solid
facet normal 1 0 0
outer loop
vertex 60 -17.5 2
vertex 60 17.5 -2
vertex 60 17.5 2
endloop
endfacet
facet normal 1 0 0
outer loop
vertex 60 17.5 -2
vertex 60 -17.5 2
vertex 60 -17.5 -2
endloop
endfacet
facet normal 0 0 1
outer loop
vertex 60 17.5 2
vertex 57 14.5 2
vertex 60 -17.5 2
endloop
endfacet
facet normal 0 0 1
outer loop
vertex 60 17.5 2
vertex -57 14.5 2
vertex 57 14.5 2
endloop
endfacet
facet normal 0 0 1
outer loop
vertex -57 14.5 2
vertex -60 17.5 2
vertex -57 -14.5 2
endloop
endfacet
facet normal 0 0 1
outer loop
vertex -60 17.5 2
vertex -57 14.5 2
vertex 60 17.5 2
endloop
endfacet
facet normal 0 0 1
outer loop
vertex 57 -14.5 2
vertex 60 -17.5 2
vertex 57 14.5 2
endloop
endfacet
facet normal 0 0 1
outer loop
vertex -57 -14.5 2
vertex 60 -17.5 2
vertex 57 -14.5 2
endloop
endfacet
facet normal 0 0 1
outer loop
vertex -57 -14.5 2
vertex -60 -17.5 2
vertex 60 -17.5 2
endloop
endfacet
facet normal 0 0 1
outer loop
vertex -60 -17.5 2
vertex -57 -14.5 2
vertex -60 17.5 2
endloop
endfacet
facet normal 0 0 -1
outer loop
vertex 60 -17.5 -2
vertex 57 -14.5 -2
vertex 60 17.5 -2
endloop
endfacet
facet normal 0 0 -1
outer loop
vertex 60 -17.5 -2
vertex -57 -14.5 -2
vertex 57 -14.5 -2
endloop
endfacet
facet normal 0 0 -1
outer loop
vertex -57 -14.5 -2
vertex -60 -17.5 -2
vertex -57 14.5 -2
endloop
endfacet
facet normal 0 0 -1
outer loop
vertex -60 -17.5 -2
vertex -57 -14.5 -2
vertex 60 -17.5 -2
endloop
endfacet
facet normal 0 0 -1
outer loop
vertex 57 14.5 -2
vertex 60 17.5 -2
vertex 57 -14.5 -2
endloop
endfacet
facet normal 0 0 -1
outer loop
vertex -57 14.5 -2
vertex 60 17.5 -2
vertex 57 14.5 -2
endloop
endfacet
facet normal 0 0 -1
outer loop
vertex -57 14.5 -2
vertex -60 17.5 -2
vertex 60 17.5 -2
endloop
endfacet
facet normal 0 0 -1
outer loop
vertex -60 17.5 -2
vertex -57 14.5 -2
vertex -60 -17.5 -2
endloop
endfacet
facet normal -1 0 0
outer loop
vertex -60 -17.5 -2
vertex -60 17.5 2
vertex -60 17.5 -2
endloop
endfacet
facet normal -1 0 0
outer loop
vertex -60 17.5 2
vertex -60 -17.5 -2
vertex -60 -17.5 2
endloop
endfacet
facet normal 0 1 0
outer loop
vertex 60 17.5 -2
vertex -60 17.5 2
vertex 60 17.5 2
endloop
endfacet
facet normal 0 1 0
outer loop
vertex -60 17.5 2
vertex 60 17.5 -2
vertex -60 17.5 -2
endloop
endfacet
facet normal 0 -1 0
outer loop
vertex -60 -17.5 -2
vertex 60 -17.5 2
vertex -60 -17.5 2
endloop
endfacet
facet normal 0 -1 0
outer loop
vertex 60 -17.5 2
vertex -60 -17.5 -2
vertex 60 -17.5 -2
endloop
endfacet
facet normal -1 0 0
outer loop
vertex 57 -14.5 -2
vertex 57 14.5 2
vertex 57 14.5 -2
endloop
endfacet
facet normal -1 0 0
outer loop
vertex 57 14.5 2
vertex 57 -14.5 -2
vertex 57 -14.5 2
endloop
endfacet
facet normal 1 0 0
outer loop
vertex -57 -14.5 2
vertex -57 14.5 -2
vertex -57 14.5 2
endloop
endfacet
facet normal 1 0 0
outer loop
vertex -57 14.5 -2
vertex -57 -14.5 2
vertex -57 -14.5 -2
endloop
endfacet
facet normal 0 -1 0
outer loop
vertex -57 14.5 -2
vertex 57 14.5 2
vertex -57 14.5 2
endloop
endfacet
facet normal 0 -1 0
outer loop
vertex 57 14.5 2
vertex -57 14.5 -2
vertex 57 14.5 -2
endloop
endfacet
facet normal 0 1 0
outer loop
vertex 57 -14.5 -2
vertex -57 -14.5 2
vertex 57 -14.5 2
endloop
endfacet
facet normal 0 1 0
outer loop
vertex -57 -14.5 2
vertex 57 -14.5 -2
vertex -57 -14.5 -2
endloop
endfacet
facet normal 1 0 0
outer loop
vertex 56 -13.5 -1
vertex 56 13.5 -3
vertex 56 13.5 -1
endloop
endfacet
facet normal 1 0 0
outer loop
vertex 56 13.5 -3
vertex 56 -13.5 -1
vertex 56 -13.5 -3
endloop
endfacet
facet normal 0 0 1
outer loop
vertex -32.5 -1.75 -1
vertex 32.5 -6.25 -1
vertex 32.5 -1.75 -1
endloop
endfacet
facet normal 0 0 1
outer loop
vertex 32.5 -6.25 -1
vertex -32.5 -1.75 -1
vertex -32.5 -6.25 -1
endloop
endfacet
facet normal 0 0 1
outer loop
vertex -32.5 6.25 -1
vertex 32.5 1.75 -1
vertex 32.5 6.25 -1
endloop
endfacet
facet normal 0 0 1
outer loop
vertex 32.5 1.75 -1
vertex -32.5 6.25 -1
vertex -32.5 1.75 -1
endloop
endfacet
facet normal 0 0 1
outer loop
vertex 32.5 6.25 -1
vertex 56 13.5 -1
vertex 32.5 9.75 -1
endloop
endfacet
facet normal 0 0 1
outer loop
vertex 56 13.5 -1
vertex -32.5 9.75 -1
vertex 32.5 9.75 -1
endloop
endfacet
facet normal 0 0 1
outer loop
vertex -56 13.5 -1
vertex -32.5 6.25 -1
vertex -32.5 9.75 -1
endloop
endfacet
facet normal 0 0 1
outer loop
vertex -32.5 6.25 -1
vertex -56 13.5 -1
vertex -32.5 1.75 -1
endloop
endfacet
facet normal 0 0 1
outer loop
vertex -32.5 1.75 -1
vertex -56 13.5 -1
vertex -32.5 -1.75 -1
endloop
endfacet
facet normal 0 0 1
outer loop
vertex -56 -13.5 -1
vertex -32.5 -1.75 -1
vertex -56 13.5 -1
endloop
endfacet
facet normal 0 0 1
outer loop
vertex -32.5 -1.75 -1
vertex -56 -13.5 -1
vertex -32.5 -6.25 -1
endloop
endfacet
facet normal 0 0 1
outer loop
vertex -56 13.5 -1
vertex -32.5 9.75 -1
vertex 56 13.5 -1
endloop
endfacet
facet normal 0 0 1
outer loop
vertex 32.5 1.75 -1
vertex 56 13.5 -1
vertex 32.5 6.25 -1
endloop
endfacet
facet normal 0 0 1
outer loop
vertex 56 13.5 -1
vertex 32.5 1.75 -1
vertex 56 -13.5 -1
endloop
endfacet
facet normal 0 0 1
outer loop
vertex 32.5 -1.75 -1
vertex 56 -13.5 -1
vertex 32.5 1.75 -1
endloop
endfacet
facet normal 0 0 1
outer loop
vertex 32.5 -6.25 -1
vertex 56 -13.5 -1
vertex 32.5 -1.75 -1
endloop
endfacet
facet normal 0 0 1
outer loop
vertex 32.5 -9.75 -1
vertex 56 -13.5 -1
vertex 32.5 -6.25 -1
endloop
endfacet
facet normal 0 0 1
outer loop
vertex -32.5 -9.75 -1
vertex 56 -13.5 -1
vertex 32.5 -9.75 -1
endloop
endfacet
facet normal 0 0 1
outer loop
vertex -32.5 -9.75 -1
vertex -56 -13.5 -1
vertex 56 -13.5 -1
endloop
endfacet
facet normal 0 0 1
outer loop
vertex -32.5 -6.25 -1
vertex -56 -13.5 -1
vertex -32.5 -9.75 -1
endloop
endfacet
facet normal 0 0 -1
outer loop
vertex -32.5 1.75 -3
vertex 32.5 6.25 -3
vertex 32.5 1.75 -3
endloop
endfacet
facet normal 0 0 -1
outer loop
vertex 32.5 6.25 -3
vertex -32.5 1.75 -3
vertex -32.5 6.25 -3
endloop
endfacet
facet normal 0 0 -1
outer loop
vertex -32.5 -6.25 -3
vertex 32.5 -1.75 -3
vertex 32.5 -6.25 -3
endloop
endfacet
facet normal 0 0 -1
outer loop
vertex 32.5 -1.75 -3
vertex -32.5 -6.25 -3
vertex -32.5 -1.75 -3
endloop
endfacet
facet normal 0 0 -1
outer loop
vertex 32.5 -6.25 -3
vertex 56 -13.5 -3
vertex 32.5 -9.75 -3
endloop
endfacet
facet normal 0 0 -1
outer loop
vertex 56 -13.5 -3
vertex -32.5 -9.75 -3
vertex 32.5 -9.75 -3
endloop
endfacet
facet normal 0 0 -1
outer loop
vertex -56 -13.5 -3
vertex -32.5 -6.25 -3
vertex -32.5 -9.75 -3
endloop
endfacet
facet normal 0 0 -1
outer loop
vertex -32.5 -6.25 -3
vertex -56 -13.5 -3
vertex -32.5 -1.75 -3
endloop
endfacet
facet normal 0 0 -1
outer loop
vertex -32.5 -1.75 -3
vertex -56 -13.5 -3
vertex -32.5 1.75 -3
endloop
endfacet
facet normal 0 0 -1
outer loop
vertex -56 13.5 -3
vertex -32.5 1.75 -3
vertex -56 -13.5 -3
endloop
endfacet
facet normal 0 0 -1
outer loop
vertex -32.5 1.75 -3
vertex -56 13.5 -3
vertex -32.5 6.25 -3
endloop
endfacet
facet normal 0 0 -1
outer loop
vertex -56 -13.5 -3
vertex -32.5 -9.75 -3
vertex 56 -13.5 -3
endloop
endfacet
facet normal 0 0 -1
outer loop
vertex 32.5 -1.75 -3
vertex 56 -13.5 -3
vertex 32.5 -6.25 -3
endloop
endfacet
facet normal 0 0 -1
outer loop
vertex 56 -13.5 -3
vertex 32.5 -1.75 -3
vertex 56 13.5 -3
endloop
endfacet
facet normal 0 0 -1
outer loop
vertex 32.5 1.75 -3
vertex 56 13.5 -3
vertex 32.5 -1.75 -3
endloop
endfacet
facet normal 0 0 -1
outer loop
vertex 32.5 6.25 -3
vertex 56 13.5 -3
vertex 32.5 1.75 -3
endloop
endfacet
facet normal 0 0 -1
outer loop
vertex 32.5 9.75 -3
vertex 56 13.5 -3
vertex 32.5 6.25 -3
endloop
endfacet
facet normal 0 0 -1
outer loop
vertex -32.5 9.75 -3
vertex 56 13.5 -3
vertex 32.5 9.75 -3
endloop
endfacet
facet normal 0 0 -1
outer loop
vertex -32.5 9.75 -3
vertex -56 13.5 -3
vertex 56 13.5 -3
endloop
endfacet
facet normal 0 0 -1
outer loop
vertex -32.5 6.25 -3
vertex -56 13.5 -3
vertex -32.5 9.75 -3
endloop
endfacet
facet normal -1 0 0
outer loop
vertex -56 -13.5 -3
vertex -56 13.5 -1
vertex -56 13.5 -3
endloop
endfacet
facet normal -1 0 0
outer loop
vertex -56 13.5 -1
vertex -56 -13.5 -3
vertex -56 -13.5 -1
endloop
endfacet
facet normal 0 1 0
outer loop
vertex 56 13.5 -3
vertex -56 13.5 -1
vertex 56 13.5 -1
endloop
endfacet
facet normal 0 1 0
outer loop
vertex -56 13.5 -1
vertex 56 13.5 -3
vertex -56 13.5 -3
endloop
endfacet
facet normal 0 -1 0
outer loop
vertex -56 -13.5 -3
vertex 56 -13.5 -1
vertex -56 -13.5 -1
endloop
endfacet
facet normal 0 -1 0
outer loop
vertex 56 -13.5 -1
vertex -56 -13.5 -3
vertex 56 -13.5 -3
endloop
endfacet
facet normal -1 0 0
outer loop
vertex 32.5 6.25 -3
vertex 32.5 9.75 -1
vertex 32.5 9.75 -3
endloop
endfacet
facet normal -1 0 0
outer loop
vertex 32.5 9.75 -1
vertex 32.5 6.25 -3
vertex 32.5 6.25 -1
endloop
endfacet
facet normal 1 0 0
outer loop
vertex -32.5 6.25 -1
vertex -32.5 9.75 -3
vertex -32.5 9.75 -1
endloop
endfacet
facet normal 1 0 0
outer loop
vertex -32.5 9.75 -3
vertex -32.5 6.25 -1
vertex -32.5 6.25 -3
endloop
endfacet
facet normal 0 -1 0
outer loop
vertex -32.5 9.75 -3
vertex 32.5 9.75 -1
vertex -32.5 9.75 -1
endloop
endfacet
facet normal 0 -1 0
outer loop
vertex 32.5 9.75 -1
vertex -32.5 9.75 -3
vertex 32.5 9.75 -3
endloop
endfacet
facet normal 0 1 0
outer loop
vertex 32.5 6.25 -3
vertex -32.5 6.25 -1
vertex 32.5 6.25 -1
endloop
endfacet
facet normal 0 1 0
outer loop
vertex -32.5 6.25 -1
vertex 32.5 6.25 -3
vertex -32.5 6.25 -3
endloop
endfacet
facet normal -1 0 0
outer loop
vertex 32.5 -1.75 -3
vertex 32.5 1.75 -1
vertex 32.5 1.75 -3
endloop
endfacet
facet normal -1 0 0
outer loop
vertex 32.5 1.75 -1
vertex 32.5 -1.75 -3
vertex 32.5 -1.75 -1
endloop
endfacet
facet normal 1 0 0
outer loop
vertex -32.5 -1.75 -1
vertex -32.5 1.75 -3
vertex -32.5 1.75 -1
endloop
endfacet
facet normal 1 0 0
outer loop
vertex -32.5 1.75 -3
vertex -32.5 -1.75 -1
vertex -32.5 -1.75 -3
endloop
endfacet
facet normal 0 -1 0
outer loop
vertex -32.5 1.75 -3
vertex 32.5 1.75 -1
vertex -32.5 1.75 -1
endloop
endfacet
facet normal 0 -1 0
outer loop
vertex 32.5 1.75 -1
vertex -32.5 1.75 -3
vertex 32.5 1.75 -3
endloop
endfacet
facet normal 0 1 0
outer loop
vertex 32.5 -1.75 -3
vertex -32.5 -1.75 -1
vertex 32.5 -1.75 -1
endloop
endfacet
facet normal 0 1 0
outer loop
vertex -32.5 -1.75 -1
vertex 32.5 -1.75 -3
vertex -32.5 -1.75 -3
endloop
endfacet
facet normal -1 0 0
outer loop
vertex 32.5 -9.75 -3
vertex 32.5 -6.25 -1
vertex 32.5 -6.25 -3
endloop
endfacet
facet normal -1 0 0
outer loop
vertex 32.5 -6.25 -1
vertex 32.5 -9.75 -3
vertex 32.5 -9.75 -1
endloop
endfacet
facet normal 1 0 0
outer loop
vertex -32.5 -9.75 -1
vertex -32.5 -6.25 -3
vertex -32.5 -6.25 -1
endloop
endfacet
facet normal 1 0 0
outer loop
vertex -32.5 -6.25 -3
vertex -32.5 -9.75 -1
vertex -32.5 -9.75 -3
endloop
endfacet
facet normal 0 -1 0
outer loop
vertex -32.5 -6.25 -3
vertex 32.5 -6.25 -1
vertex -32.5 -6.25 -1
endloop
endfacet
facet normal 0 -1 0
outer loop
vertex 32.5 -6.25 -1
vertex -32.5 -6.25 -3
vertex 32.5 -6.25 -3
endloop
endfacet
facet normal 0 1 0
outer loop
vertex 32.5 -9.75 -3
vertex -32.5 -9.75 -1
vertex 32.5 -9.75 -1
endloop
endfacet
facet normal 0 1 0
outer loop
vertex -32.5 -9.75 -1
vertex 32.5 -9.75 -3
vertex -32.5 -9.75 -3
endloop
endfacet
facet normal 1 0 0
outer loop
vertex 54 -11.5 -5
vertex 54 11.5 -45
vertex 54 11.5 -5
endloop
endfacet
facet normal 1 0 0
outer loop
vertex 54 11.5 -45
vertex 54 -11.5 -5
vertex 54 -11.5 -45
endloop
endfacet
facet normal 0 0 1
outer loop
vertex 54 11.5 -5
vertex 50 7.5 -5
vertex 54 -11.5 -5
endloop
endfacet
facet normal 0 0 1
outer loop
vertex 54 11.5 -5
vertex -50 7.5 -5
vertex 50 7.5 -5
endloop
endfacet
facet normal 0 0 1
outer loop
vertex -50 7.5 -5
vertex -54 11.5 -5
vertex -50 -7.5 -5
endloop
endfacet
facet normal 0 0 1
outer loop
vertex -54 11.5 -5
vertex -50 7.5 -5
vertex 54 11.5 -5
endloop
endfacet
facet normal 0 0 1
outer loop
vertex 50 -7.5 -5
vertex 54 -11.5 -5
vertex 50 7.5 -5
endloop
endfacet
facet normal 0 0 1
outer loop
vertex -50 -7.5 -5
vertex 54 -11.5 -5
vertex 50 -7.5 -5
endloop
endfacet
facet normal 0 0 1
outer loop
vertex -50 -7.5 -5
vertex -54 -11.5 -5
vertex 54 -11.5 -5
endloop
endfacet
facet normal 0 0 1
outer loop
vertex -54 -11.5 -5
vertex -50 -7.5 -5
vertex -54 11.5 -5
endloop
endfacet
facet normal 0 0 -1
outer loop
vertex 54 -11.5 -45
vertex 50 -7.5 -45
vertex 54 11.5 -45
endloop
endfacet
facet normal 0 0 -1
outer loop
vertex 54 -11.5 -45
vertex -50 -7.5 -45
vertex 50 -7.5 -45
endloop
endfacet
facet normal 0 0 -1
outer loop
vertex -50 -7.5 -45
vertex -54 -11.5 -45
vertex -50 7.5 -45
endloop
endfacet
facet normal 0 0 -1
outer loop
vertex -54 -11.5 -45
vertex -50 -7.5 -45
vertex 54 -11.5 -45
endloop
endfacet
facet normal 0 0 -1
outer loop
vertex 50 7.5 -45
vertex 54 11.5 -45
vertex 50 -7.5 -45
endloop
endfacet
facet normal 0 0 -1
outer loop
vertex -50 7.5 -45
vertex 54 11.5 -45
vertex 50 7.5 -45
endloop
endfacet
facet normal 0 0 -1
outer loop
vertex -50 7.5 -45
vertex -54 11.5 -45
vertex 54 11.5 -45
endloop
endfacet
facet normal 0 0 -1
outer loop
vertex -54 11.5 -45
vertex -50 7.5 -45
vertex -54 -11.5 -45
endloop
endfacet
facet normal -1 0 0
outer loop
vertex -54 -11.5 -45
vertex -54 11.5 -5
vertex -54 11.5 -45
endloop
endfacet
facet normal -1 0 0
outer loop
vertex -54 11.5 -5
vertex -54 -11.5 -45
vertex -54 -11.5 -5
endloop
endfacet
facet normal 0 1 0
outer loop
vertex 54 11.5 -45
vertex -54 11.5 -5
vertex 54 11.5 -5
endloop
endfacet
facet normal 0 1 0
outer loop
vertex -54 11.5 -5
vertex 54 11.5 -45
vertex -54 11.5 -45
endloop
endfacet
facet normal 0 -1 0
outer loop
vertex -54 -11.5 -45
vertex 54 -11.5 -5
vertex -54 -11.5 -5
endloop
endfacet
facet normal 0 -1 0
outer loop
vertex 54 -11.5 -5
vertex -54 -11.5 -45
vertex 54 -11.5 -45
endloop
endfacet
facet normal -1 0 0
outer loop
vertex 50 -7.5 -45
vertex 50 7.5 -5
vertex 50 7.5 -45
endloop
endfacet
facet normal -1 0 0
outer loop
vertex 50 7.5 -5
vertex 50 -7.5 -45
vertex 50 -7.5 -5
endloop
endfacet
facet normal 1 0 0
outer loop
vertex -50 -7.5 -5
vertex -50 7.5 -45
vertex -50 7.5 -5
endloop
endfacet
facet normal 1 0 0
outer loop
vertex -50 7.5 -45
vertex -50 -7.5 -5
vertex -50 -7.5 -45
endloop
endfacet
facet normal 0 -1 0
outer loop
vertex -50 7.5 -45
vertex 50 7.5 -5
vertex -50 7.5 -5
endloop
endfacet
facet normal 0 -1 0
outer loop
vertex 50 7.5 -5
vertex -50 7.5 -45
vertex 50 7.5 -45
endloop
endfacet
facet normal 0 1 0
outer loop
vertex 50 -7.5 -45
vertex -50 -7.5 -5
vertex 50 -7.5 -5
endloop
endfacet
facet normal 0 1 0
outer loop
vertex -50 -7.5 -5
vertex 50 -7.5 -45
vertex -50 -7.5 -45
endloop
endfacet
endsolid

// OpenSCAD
// ====================================================================================
// REVOLUTIONARY TECHNOLOGY COMPANY & UNIVERSITY OF WASHINGTON DEPARTMENT OF PHYSICS
// Subsystem: copo_hvac_dashboard.scad (Authentic 1969 Climate Faceplate Base)
// Core Objective: Fits OtterBox dash console while translating mechanical slider paths
// Center Origin (0,0,0) = Geometric Centerpoint of the 1969 Chrome Faceplate Rim
// ====================================================================================

$fn = 100; // CNC laser-cutting and plastic injection finish parameter

// --- 1969 Factory Faceplate Dimensions (mm) ---
inch_to_mm         = 25.4;
faceplate_width    = 120.00; // Fits the exact pocket inside otterbox_master_interior.scad
faceplate_height   = 35.00;
bezel_lip_depth    = 4.00;
slider_slot_length = 65.00;
slider_slot_height = 3.50;

module historical_chrome_bezel() {
    echo("COMPILING 1969 ENVIRONMENTAL CONTROL SURFACE COMPONENT");
    color("Silver") { // Polished chrome exterior frame accent
        difference() {
            // Main rectangular faceplate bezel block
            cube([faceplate_width, faceplate_height, bezel_lip_depth], center=true);
            // Hollow center core step-down for internal text insert plate
            cube([faceplate_width - 6, faceplate_height - 6, bezel_lip_depth + 2], center=true);
        }
    }
}

module lever_slot_tracks() {
    // Generates the three horizontal slot tracks used by the 1969 mechanical handles
    color("Black") {
        translate([0, 0, -bezel_lip_depth/2]) {
            difference() {
                // Internal black backing plate insert
                cube([faceplate_width - 8, faceplate_height - 8, 2], center=true);
                
                // Track 1: Upper Slider Track (FAN Speed selection axis)
                translate([0, 8, 0])
                    cube([slider_slot_length, slider_slot_height, 5], center=true);
                
                // Track 2: Middle Slider Track (OFF / HEAT / DE-ICE mechanical selection route)
                translate([0, 0, 0])
                    cube([slider_slot_length, slider_slot_height, 5], center=true);
                
                // Track 3: Lower Slider Track (PARAMETRIC COPO TEMPERATURE SELECTION WAVE)
                translate([0, -8, 0])
                    cube([slider_slot_length, slider_slot_height, 5], center=true);
            }
        }
    }
}

module structural_rear_housing() {
    // Sealed housing protruding from the rear of the faceplate.
    // Protects the high-accuracy linear sliders from dirt, moisture, and dust.
    color("DimGrey") {
        translate([0, 0, -25])
            difference() {
                cube([faceplate_width - 12, faceplate_height - 12, 40], center=true);
                cube([faceplate_width - 20, faceplate_height - 20, 42], center=true); // Sensor bay cavity
            }
    }
}

// --- Composite Climate Interface Instantiation ---
union() {
    historical_chrome_bezel();
    lever_slot_tracks();
    structural_rear_housing();
}
